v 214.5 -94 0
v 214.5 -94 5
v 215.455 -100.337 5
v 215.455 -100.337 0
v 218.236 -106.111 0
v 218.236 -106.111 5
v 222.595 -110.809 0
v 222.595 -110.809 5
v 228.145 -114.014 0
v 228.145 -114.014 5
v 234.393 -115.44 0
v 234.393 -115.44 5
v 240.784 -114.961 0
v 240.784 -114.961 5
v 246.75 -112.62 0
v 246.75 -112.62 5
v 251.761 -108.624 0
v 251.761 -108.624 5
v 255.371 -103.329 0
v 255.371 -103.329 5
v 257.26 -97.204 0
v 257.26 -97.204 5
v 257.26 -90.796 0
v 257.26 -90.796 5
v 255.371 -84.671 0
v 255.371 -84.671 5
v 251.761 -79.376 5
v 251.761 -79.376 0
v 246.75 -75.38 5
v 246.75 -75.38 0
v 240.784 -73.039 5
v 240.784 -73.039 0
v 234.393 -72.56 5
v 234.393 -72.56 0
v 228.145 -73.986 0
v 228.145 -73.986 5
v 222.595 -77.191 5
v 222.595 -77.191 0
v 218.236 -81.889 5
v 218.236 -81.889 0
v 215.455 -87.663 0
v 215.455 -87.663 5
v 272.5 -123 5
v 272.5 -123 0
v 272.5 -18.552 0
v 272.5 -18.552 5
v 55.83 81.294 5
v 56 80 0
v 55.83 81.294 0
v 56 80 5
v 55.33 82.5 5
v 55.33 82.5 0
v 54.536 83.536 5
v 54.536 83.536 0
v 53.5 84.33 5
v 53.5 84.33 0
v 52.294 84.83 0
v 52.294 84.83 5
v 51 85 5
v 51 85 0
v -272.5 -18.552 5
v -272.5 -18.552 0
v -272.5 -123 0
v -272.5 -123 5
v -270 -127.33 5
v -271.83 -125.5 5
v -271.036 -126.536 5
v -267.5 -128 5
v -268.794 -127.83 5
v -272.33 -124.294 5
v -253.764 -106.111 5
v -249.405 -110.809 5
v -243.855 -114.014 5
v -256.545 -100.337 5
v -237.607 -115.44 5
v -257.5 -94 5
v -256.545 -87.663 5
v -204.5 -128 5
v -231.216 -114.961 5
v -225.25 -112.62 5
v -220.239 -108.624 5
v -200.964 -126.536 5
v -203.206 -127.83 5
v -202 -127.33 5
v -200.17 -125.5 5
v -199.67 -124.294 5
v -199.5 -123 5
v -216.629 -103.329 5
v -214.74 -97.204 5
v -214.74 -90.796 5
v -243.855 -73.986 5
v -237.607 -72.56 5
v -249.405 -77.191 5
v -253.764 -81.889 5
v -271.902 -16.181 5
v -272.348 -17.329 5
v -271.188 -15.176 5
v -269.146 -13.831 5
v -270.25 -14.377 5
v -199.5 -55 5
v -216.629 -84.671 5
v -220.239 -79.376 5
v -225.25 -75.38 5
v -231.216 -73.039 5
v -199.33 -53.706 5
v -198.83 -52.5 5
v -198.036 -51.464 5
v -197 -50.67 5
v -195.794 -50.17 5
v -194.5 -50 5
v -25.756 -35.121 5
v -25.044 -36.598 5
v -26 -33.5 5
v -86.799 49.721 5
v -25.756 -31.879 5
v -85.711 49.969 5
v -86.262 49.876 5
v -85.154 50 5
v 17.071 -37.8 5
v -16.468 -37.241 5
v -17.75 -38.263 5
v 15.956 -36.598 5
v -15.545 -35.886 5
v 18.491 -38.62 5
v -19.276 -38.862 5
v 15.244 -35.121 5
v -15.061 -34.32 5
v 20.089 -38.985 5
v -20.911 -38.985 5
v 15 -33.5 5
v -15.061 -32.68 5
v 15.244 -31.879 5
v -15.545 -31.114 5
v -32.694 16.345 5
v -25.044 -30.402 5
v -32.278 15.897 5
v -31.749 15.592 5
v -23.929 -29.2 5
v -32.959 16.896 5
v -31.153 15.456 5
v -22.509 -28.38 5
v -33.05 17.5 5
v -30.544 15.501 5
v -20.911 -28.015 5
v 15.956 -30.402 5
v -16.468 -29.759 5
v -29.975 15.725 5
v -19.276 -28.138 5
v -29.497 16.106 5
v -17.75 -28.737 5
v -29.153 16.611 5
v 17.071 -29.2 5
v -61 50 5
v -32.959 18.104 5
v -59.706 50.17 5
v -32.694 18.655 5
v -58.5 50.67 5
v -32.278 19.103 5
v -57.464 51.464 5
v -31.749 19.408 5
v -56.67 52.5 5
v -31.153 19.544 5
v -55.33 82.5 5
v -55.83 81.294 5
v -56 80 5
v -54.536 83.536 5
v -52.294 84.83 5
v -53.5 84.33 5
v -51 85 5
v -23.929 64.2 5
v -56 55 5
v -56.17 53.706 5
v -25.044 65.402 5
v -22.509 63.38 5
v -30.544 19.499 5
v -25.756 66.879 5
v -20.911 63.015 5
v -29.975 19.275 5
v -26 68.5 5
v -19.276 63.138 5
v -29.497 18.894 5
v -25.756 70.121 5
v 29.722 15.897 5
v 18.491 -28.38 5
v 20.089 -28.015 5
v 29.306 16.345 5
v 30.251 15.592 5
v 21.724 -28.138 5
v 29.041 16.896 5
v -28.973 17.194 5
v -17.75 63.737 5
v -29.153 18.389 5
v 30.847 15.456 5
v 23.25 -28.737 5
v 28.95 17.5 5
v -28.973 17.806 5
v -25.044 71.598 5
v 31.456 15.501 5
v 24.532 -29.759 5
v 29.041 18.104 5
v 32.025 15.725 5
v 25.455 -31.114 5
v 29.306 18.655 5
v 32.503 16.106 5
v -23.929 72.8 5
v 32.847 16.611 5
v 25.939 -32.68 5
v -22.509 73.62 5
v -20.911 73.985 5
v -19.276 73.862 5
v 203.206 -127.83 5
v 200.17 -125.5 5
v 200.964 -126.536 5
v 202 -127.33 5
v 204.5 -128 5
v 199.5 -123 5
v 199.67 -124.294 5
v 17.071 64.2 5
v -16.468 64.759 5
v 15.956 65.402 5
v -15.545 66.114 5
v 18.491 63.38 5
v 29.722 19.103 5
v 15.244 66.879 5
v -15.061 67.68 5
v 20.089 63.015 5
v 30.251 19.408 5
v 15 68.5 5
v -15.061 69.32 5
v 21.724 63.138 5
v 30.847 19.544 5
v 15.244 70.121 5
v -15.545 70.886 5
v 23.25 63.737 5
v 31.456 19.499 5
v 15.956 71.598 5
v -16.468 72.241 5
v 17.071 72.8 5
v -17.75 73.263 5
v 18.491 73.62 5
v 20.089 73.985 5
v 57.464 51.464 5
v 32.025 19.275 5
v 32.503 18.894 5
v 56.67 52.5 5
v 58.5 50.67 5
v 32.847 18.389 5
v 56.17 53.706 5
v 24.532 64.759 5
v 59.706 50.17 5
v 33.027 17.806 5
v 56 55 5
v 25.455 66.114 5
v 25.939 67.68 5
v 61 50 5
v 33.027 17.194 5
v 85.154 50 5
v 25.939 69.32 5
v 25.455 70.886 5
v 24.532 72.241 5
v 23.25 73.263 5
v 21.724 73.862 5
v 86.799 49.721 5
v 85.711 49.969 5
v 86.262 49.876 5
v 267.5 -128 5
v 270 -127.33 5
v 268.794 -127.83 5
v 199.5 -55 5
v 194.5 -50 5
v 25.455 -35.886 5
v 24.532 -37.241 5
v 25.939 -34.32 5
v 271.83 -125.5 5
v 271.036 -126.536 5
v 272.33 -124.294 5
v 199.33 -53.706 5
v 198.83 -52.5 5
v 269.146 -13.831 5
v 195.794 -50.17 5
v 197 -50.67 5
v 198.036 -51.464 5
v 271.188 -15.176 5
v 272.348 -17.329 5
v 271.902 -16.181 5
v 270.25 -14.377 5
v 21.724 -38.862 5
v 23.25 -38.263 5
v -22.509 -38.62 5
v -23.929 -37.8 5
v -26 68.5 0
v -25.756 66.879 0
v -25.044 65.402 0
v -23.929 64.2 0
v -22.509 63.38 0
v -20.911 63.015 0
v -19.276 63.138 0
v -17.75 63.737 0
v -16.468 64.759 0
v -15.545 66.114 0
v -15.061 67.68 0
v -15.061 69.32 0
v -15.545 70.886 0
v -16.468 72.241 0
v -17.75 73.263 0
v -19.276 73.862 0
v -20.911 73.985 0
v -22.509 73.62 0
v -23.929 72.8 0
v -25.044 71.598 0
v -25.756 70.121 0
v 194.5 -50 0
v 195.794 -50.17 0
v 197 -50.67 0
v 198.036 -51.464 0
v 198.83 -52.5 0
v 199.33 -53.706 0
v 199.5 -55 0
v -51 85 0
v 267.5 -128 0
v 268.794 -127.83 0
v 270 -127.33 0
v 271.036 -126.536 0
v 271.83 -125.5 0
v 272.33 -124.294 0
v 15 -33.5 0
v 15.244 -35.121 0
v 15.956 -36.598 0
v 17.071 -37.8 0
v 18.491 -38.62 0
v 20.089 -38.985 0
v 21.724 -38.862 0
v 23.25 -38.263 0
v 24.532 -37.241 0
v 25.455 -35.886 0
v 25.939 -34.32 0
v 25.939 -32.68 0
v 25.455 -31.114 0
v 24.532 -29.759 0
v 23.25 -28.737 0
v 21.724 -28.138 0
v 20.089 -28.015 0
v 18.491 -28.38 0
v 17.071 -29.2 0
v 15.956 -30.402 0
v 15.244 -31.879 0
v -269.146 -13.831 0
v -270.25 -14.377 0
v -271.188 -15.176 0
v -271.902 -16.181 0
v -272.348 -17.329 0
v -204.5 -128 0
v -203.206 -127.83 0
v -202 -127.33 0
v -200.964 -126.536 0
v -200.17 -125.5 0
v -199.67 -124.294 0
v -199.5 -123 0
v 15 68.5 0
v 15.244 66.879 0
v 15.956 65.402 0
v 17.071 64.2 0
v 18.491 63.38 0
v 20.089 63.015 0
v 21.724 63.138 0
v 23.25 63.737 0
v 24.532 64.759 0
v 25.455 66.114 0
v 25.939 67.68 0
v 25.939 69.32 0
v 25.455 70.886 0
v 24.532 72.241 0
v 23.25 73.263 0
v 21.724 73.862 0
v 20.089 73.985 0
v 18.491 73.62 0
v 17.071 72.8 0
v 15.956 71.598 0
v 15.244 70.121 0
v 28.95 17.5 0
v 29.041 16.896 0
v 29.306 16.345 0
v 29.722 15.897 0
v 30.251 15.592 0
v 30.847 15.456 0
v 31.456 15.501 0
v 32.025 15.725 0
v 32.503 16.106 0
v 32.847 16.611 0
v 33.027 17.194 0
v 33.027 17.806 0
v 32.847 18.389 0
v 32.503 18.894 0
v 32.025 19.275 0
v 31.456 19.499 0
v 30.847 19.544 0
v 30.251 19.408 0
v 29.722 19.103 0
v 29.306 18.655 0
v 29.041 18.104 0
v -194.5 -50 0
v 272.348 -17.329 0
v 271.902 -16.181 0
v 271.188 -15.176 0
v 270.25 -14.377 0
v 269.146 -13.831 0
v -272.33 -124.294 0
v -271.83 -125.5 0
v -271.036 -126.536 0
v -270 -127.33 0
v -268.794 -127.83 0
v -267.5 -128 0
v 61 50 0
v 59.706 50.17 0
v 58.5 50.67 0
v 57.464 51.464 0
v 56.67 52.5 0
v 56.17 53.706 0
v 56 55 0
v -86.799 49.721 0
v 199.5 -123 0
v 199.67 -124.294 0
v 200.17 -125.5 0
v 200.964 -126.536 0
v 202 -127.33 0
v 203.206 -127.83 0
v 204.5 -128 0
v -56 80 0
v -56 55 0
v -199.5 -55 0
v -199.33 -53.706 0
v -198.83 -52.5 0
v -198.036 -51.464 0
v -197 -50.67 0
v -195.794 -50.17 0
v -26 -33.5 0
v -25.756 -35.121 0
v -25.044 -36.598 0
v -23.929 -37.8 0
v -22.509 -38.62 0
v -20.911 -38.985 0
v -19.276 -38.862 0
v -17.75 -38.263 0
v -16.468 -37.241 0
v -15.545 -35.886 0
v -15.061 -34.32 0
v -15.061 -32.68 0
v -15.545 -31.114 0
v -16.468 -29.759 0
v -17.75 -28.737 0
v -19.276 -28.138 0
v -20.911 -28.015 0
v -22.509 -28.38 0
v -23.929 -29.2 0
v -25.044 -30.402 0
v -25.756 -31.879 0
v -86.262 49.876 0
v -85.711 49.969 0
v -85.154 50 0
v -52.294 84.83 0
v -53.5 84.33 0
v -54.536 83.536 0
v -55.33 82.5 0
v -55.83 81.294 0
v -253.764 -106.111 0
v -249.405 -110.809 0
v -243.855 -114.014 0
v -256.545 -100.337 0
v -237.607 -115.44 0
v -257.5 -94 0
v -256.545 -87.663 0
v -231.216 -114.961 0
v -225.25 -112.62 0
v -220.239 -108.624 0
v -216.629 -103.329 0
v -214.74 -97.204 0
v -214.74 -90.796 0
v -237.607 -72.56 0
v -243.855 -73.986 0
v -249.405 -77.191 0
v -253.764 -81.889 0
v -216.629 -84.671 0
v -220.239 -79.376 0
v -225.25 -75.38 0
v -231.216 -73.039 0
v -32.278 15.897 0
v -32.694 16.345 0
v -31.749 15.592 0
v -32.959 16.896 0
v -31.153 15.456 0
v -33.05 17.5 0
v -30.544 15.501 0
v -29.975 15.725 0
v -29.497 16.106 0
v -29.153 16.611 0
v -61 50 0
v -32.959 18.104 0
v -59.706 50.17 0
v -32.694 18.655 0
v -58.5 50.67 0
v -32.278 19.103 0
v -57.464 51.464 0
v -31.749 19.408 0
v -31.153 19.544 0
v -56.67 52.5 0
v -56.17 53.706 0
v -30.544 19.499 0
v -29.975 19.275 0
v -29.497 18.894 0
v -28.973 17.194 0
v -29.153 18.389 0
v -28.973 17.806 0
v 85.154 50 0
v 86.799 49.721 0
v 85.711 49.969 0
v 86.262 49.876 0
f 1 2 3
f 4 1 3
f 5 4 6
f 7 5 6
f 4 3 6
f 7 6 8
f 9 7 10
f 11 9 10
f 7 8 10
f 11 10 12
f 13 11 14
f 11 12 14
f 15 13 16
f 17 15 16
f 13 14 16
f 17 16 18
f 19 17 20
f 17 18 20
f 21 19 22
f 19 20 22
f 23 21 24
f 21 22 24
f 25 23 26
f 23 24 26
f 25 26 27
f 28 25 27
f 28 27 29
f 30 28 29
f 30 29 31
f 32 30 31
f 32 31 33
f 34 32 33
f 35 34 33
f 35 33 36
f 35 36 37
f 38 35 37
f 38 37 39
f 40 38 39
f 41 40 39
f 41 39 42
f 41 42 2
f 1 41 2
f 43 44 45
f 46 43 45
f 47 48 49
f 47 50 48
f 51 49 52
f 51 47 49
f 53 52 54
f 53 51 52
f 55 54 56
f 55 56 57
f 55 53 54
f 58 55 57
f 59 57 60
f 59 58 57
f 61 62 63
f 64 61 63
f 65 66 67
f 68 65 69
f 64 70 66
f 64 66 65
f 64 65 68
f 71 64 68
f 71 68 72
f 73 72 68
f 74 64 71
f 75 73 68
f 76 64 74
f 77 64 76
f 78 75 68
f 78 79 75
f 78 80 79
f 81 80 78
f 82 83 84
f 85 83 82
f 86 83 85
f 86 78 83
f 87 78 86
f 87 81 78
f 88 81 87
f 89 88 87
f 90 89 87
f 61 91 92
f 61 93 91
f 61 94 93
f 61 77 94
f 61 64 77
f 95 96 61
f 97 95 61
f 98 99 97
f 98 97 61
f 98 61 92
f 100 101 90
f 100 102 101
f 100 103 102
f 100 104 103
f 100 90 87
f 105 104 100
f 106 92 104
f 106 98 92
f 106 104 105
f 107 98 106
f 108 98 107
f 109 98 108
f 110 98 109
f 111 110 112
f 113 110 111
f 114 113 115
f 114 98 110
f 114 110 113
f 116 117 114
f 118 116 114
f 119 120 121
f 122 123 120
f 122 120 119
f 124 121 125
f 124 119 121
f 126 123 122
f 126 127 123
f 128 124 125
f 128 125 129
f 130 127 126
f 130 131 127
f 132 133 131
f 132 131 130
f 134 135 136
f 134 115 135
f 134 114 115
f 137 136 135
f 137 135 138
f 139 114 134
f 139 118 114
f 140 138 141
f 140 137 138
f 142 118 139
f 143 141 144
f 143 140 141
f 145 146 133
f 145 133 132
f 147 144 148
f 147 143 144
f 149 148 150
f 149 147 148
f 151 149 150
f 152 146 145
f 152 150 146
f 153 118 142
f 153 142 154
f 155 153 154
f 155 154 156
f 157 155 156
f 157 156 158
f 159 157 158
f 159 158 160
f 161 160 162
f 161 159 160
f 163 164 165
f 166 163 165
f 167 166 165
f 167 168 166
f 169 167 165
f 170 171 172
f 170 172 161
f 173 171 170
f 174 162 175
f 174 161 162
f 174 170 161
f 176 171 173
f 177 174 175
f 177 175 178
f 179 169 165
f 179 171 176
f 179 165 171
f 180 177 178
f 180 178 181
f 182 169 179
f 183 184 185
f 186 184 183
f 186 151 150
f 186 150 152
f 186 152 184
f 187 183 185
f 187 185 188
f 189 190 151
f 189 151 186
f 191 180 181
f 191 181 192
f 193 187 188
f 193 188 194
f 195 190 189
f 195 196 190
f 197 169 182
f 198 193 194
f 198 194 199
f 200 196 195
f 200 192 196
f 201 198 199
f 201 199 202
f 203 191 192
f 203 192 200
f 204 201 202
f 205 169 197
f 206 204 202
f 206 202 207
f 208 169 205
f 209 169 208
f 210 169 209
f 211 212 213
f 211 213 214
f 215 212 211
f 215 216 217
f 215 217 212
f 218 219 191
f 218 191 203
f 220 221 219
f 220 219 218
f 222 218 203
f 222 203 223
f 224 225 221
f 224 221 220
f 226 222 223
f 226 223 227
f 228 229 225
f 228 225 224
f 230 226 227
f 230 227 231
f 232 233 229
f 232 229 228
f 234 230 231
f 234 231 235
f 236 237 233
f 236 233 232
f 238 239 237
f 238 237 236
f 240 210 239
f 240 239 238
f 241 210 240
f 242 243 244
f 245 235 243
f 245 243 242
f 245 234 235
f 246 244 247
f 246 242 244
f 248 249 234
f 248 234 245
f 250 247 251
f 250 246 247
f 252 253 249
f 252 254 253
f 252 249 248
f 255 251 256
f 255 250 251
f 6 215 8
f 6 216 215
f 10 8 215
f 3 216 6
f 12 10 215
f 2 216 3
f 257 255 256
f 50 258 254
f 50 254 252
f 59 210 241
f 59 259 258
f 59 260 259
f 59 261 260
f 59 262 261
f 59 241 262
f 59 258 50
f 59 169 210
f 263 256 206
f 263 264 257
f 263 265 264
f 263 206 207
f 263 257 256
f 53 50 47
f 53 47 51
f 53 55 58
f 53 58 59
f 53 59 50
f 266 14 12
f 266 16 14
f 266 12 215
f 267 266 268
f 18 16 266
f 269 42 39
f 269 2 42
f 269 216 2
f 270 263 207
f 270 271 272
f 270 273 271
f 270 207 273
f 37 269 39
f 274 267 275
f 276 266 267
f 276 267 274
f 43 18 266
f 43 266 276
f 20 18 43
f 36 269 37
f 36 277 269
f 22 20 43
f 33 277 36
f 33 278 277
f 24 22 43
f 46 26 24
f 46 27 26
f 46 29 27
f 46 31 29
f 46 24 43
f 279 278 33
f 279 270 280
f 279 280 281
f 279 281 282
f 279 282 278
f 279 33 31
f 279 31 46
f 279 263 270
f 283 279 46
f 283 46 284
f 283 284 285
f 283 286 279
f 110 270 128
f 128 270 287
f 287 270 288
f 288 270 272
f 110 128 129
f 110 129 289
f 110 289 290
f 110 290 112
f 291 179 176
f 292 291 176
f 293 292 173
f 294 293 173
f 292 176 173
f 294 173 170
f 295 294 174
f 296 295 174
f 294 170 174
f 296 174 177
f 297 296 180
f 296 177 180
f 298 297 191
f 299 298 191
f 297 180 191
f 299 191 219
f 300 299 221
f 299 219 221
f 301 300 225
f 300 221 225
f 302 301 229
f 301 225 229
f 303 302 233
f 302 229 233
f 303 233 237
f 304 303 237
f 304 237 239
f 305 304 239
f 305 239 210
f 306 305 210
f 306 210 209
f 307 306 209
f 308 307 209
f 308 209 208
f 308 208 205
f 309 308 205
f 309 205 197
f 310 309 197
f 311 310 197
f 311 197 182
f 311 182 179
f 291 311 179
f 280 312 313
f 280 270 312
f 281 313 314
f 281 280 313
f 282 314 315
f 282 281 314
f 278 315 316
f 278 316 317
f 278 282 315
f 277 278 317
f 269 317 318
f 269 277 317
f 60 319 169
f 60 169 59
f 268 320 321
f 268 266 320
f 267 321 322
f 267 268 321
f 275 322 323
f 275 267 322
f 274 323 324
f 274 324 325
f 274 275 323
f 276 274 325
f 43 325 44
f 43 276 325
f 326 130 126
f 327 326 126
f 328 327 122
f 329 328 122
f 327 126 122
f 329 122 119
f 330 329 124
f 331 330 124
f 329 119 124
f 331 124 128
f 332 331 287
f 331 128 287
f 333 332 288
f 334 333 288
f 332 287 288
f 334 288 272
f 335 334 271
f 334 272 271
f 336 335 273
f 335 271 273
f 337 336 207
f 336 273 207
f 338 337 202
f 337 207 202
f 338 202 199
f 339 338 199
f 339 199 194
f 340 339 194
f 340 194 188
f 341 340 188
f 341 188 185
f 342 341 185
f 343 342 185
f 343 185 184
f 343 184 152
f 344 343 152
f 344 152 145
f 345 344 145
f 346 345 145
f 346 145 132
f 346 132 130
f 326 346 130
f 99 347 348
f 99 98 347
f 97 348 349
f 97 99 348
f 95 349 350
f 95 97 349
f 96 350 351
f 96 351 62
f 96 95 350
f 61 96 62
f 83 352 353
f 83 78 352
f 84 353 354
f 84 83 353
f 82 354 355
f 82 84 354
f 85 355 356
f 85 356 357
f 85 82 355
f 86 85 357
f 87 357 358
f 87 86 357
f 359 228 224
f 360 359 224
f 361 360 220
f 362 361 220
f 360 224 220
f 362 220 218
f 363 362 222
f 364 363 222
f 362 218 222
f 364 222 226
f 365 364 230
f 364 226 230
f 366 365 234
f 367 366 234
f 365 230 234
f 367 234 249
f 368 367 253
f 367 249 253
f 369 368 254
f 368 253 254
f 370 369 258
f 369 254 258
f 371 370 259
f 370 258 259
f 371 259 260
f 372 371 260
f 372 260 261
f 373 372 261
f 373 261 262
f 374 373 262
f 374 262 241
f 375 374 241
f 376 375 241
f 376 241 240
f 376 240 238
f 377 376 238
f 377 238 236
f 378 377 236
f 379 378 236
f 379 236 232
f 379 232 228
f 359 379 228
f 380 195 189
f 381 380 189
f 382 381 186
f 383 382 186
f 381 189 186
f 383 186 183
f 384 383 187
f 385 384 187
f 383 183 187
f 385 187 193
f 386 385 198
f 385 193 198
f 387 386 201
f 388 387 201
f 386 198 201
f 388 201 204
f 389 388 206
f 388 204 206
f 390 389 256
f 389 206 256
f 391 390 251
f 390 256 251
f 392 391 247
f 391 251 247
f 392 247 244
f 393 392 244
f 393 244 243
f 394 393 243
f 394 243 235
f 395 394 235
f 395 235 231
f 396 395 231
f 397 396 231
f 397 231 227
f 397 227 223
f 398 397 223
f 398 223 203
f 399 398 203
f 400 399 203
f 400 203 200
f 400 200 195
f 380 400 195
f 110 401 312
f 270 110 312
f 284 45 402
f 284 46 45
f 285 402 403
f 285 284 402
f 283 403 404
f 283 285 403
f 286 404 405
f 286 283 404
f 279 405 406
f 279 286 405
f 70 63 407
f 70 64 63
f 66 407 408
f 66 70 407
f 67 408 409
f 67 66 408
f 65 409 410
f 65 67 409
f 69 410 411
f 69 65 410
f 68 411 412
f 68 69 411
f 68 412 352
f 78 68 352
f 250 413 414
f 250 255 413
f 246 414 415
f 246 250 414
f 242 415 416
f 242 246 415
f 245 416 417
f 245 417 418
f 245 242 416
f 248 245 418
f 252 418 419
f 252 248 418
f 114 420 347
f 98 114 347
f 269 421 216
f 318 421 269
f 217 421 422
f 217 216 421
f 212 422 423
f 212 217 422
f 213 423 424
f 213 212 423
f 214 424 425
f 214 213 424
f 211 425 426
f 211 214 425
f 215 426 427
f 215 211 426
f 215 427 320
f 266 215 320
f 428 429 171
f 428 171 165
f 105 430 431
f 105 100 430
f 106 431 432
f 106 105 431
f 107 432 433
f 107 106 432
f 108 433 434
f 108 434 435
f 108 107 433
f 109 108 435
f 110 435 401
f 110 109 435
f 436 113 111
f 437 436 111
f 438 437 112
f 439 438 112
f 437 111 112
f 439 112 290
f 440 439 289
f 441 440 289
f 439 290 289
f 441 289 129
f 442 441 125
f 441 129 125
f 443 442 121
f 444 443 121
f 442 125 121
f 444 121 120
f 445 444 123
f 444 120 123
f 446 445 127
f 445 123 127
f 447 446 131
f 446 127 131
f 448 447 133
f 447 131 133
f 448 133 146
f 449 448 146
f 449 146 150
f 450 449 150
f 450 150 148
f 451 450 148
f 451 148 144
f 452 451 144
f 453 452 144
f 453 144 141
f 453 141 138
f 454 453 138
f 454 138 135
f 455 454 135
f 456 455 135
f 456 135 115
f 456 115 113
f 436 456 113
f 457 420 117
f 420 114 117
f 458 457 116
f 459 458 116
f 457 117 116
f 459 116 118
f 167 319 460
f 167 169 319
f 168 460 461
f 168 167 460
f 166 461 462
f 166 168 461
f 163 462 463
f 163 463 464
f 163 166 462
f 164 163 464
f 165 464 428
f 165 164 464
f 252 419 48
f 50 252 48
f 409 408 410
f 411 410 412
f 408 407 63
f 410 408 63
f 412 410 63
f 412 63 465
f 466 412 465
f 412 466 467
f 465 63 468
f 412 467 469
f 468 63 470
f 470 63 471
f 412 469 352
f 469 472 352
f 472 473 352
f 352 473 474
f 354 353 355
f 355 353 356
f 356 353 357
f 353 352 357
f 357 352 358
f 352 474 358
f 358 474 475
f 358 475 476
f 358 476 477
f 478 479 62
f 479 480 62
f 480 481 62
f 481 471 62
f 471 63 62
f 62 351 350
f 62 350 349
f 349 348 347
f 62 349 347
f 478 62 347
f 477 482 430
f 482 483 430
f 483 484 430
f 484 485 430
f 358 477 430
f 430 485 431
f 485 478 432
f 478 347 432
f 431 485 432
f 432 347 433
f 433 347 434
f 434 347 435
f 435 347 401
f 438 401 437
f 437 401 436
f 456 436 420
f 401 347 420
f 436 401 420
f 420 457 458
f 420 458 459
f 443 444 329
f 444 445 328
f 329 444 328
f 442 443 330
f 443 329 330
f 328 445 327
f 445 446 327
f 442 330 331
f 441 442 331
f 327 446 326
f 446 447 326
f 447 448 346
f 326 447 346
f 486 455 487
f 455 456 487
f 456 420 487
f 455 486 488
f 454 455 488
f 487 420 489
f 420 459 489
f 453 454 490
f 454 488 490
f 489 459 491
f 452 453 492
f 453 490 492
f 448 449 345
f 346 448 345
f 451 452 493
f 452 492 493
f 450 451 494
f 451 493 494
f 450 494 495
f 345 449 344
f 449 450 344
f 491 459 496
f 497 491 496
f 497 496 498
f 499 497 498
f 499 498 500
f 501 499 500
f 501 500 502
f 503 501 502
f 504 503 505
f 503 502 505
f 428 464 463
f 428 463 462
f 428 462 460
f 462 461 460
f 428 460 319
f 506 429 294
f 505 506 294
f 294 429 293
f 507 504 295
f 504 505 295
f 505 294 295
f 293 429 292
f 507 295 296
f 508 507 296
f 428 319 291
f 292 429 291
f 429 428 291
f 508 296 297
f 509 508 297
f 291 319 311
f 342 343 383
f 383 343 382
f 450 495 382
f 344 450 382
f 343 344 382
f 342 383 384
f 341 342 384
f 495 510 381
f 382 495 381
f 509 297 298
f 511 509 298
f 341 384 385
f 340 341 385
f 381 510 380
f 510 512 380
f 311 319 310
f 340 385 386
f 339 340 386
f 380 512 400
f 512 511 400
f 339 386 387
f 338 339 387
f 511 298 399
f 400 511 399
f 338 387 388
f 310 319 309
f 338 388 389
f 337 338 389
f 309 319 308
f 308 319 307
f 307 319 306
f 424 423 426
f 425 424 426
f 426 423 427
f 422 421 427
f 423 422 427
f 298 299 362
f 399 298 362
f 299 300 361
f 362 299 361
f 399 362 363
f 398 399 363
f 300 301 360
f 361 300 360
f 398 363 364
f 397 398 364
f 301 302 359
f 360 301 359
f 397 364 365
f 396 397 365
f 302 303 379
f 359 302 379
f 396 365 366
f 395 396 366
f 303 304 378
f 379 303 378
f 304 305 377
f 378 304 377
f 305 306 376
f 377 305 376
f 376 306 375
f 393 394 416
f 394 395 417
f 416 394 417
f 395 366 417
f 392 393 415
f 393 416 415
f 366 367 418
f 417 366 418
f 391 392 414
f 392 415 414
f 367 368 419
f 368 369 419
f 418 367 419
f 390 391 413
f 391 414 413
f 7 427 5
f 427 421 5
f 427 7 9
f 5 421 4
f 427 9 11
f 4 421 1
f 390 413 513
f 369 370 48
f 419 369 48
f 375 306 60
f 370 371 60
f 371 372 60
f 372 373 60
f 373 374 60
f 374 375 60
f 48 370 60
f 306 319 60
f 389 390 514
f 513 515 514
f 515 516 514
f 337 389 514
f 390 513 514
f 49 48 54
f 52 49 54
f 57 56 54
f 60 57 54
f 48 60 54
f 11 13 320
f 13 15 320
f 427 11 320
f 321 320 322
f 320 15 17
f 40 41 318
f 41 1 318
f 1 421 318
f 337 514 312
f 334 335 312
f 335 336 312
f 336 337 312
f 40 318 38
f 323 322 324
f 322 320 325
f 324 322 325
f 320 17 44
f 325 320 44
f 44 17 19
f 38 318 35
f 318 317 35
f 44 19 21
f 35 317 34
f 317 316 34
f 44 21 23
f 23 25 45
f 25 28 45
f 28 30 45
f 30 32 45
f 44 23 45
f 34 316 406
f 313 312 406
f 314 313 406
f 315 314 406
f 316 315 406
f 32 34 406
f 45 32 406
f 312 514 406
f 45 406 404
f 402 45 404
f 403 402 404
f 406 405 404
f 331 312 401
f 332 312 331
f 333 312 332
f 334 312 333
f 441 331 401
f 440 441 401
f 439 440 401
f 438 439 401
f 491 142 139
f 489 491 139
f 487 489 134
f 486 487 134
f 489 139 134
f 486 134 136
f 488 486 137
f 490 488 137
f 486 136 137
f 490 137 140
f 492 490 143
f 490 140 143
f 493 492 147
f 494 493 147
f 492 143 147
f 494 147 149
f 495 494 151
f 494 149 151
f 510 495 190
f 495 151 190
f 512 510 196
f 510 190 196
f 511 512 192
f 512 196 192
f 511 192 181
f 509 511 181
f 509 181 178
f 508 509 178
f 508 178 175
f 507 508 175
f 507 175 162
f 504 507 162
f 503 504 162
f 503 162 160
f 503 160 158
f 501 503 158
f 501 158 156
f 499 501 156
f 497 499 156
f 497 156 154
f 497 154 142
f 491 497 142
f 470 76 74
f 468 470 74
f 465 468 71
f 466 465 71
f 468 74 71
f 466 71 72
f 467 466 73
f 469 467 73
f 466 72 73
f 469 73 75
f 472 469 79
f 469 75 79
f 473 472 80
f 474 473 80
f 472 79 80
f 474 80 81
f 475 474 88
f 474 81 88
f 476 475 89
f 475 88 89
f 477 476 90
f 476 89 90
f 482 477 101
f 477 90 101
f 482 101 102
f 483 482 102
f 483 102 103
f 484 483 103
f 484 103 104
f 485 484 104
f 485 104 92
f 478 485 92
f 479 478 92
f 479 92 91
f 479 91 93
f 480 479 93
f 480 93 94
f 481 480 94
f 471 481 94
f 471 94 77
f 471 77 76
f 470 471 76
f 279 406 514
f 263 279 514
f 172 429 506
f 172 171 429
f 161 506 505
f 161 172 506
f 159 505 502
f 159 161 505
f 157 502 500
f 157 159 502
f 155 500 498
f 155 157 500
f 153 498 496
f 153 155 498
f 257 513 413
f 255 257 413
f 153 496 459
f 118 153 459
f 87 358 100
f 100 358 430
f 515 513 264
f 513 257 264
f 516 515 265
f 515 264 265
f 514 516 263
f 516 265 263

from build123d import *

# Parameters (mm, degrees)
F0_W     = 73
F0_H     = 78
F0_W_2   = 112
F0_H_2   = 35
F1_DEPTH = 5
F2_R     = 5
F3_R     = 5
F6_D     = 4.1
F8_D     = 43
F9_D     = 11


# Not quite as in the source:
# - a feature names something its author has since deleted; it is built from what else it names


with BuildPart() as f1:
    # F0 (on Top) → F1 (new body)
    with BuildSketch(Plane.XY):
        Polygon((-56, 50), (-86, 50), (-272.5, -15), (-272.5, -50), (-199.5, -50), (199.5, -50), (272.5, -50), (272.5, -15), (86, 50), (56, 50), align=None)
        with Locations((-236, -89)):
            Rectangle(F0_W, F0_H)
        with Locations((236, -89)):
            Rectangle(F0_W, F0_H)
        with Locations((0, 67.5)):
            Rectangle(F0_W_2, F0_H_2)
    extrude(amount=F1_DEPTH)

    # F2
    f2_edges = [f1.edges().sort_by_distance(p)[0] for p in [
        (-272.5, -128, 2.5),
        (-199.5, -128, 2.5),
        (199.5, -128, 2.5),
        (272.5, -128, 2.5),
        (272.5, -15, 2.5),
        (-272.5, -15, 2.5),
        (-199.5, -50, 2.5),
        (199.5, -50, 2.5),
        (-56, 50, 2.5),
        (-56, 85, 2.5),
        (56, 85, 2.5),
        (56, 50, 2.5),
    ]]
    fillet(f2_edges, radius=F2_R)

    # F3
    f3_edges = [f1.edges().sort_by_distance(p)[0] for p in [
        (86, 50, 2.5),
        (-86, 50, 2.5),
    ]]
    fillet(f3_edges, radius=F3_R)

    # F6 (through all)
    with Locations(Plane(origin=(0, 0, 0), x_dir=(1, 0, 0), z_dir=(0, 0, -1))):
        with Locations((-31, -17.5), (31, -17.5)):
            Hole(F6_D / 2)

    # F8 (through all)
    with Locations(Plane(origin=(0, 0, 0), x_dir=(1, 0, 0), z_dir=(0, 0, -1))):
        with Locations((-236, 94), (236, 94)):
            Hole(F8_D / 2)

    # F9 (through all)
    with Locations(Plane(origin=(0, 0, 0), x_dir=(1, 0, 0), z_dir=(0, 0, -1))):
        with Locations((-20.5, -68.5), (20.5, -68.5), (-20.5, 33.5), (20.5, 33.5)):
            Hole(F9_D / 2)


solid = f1.part
